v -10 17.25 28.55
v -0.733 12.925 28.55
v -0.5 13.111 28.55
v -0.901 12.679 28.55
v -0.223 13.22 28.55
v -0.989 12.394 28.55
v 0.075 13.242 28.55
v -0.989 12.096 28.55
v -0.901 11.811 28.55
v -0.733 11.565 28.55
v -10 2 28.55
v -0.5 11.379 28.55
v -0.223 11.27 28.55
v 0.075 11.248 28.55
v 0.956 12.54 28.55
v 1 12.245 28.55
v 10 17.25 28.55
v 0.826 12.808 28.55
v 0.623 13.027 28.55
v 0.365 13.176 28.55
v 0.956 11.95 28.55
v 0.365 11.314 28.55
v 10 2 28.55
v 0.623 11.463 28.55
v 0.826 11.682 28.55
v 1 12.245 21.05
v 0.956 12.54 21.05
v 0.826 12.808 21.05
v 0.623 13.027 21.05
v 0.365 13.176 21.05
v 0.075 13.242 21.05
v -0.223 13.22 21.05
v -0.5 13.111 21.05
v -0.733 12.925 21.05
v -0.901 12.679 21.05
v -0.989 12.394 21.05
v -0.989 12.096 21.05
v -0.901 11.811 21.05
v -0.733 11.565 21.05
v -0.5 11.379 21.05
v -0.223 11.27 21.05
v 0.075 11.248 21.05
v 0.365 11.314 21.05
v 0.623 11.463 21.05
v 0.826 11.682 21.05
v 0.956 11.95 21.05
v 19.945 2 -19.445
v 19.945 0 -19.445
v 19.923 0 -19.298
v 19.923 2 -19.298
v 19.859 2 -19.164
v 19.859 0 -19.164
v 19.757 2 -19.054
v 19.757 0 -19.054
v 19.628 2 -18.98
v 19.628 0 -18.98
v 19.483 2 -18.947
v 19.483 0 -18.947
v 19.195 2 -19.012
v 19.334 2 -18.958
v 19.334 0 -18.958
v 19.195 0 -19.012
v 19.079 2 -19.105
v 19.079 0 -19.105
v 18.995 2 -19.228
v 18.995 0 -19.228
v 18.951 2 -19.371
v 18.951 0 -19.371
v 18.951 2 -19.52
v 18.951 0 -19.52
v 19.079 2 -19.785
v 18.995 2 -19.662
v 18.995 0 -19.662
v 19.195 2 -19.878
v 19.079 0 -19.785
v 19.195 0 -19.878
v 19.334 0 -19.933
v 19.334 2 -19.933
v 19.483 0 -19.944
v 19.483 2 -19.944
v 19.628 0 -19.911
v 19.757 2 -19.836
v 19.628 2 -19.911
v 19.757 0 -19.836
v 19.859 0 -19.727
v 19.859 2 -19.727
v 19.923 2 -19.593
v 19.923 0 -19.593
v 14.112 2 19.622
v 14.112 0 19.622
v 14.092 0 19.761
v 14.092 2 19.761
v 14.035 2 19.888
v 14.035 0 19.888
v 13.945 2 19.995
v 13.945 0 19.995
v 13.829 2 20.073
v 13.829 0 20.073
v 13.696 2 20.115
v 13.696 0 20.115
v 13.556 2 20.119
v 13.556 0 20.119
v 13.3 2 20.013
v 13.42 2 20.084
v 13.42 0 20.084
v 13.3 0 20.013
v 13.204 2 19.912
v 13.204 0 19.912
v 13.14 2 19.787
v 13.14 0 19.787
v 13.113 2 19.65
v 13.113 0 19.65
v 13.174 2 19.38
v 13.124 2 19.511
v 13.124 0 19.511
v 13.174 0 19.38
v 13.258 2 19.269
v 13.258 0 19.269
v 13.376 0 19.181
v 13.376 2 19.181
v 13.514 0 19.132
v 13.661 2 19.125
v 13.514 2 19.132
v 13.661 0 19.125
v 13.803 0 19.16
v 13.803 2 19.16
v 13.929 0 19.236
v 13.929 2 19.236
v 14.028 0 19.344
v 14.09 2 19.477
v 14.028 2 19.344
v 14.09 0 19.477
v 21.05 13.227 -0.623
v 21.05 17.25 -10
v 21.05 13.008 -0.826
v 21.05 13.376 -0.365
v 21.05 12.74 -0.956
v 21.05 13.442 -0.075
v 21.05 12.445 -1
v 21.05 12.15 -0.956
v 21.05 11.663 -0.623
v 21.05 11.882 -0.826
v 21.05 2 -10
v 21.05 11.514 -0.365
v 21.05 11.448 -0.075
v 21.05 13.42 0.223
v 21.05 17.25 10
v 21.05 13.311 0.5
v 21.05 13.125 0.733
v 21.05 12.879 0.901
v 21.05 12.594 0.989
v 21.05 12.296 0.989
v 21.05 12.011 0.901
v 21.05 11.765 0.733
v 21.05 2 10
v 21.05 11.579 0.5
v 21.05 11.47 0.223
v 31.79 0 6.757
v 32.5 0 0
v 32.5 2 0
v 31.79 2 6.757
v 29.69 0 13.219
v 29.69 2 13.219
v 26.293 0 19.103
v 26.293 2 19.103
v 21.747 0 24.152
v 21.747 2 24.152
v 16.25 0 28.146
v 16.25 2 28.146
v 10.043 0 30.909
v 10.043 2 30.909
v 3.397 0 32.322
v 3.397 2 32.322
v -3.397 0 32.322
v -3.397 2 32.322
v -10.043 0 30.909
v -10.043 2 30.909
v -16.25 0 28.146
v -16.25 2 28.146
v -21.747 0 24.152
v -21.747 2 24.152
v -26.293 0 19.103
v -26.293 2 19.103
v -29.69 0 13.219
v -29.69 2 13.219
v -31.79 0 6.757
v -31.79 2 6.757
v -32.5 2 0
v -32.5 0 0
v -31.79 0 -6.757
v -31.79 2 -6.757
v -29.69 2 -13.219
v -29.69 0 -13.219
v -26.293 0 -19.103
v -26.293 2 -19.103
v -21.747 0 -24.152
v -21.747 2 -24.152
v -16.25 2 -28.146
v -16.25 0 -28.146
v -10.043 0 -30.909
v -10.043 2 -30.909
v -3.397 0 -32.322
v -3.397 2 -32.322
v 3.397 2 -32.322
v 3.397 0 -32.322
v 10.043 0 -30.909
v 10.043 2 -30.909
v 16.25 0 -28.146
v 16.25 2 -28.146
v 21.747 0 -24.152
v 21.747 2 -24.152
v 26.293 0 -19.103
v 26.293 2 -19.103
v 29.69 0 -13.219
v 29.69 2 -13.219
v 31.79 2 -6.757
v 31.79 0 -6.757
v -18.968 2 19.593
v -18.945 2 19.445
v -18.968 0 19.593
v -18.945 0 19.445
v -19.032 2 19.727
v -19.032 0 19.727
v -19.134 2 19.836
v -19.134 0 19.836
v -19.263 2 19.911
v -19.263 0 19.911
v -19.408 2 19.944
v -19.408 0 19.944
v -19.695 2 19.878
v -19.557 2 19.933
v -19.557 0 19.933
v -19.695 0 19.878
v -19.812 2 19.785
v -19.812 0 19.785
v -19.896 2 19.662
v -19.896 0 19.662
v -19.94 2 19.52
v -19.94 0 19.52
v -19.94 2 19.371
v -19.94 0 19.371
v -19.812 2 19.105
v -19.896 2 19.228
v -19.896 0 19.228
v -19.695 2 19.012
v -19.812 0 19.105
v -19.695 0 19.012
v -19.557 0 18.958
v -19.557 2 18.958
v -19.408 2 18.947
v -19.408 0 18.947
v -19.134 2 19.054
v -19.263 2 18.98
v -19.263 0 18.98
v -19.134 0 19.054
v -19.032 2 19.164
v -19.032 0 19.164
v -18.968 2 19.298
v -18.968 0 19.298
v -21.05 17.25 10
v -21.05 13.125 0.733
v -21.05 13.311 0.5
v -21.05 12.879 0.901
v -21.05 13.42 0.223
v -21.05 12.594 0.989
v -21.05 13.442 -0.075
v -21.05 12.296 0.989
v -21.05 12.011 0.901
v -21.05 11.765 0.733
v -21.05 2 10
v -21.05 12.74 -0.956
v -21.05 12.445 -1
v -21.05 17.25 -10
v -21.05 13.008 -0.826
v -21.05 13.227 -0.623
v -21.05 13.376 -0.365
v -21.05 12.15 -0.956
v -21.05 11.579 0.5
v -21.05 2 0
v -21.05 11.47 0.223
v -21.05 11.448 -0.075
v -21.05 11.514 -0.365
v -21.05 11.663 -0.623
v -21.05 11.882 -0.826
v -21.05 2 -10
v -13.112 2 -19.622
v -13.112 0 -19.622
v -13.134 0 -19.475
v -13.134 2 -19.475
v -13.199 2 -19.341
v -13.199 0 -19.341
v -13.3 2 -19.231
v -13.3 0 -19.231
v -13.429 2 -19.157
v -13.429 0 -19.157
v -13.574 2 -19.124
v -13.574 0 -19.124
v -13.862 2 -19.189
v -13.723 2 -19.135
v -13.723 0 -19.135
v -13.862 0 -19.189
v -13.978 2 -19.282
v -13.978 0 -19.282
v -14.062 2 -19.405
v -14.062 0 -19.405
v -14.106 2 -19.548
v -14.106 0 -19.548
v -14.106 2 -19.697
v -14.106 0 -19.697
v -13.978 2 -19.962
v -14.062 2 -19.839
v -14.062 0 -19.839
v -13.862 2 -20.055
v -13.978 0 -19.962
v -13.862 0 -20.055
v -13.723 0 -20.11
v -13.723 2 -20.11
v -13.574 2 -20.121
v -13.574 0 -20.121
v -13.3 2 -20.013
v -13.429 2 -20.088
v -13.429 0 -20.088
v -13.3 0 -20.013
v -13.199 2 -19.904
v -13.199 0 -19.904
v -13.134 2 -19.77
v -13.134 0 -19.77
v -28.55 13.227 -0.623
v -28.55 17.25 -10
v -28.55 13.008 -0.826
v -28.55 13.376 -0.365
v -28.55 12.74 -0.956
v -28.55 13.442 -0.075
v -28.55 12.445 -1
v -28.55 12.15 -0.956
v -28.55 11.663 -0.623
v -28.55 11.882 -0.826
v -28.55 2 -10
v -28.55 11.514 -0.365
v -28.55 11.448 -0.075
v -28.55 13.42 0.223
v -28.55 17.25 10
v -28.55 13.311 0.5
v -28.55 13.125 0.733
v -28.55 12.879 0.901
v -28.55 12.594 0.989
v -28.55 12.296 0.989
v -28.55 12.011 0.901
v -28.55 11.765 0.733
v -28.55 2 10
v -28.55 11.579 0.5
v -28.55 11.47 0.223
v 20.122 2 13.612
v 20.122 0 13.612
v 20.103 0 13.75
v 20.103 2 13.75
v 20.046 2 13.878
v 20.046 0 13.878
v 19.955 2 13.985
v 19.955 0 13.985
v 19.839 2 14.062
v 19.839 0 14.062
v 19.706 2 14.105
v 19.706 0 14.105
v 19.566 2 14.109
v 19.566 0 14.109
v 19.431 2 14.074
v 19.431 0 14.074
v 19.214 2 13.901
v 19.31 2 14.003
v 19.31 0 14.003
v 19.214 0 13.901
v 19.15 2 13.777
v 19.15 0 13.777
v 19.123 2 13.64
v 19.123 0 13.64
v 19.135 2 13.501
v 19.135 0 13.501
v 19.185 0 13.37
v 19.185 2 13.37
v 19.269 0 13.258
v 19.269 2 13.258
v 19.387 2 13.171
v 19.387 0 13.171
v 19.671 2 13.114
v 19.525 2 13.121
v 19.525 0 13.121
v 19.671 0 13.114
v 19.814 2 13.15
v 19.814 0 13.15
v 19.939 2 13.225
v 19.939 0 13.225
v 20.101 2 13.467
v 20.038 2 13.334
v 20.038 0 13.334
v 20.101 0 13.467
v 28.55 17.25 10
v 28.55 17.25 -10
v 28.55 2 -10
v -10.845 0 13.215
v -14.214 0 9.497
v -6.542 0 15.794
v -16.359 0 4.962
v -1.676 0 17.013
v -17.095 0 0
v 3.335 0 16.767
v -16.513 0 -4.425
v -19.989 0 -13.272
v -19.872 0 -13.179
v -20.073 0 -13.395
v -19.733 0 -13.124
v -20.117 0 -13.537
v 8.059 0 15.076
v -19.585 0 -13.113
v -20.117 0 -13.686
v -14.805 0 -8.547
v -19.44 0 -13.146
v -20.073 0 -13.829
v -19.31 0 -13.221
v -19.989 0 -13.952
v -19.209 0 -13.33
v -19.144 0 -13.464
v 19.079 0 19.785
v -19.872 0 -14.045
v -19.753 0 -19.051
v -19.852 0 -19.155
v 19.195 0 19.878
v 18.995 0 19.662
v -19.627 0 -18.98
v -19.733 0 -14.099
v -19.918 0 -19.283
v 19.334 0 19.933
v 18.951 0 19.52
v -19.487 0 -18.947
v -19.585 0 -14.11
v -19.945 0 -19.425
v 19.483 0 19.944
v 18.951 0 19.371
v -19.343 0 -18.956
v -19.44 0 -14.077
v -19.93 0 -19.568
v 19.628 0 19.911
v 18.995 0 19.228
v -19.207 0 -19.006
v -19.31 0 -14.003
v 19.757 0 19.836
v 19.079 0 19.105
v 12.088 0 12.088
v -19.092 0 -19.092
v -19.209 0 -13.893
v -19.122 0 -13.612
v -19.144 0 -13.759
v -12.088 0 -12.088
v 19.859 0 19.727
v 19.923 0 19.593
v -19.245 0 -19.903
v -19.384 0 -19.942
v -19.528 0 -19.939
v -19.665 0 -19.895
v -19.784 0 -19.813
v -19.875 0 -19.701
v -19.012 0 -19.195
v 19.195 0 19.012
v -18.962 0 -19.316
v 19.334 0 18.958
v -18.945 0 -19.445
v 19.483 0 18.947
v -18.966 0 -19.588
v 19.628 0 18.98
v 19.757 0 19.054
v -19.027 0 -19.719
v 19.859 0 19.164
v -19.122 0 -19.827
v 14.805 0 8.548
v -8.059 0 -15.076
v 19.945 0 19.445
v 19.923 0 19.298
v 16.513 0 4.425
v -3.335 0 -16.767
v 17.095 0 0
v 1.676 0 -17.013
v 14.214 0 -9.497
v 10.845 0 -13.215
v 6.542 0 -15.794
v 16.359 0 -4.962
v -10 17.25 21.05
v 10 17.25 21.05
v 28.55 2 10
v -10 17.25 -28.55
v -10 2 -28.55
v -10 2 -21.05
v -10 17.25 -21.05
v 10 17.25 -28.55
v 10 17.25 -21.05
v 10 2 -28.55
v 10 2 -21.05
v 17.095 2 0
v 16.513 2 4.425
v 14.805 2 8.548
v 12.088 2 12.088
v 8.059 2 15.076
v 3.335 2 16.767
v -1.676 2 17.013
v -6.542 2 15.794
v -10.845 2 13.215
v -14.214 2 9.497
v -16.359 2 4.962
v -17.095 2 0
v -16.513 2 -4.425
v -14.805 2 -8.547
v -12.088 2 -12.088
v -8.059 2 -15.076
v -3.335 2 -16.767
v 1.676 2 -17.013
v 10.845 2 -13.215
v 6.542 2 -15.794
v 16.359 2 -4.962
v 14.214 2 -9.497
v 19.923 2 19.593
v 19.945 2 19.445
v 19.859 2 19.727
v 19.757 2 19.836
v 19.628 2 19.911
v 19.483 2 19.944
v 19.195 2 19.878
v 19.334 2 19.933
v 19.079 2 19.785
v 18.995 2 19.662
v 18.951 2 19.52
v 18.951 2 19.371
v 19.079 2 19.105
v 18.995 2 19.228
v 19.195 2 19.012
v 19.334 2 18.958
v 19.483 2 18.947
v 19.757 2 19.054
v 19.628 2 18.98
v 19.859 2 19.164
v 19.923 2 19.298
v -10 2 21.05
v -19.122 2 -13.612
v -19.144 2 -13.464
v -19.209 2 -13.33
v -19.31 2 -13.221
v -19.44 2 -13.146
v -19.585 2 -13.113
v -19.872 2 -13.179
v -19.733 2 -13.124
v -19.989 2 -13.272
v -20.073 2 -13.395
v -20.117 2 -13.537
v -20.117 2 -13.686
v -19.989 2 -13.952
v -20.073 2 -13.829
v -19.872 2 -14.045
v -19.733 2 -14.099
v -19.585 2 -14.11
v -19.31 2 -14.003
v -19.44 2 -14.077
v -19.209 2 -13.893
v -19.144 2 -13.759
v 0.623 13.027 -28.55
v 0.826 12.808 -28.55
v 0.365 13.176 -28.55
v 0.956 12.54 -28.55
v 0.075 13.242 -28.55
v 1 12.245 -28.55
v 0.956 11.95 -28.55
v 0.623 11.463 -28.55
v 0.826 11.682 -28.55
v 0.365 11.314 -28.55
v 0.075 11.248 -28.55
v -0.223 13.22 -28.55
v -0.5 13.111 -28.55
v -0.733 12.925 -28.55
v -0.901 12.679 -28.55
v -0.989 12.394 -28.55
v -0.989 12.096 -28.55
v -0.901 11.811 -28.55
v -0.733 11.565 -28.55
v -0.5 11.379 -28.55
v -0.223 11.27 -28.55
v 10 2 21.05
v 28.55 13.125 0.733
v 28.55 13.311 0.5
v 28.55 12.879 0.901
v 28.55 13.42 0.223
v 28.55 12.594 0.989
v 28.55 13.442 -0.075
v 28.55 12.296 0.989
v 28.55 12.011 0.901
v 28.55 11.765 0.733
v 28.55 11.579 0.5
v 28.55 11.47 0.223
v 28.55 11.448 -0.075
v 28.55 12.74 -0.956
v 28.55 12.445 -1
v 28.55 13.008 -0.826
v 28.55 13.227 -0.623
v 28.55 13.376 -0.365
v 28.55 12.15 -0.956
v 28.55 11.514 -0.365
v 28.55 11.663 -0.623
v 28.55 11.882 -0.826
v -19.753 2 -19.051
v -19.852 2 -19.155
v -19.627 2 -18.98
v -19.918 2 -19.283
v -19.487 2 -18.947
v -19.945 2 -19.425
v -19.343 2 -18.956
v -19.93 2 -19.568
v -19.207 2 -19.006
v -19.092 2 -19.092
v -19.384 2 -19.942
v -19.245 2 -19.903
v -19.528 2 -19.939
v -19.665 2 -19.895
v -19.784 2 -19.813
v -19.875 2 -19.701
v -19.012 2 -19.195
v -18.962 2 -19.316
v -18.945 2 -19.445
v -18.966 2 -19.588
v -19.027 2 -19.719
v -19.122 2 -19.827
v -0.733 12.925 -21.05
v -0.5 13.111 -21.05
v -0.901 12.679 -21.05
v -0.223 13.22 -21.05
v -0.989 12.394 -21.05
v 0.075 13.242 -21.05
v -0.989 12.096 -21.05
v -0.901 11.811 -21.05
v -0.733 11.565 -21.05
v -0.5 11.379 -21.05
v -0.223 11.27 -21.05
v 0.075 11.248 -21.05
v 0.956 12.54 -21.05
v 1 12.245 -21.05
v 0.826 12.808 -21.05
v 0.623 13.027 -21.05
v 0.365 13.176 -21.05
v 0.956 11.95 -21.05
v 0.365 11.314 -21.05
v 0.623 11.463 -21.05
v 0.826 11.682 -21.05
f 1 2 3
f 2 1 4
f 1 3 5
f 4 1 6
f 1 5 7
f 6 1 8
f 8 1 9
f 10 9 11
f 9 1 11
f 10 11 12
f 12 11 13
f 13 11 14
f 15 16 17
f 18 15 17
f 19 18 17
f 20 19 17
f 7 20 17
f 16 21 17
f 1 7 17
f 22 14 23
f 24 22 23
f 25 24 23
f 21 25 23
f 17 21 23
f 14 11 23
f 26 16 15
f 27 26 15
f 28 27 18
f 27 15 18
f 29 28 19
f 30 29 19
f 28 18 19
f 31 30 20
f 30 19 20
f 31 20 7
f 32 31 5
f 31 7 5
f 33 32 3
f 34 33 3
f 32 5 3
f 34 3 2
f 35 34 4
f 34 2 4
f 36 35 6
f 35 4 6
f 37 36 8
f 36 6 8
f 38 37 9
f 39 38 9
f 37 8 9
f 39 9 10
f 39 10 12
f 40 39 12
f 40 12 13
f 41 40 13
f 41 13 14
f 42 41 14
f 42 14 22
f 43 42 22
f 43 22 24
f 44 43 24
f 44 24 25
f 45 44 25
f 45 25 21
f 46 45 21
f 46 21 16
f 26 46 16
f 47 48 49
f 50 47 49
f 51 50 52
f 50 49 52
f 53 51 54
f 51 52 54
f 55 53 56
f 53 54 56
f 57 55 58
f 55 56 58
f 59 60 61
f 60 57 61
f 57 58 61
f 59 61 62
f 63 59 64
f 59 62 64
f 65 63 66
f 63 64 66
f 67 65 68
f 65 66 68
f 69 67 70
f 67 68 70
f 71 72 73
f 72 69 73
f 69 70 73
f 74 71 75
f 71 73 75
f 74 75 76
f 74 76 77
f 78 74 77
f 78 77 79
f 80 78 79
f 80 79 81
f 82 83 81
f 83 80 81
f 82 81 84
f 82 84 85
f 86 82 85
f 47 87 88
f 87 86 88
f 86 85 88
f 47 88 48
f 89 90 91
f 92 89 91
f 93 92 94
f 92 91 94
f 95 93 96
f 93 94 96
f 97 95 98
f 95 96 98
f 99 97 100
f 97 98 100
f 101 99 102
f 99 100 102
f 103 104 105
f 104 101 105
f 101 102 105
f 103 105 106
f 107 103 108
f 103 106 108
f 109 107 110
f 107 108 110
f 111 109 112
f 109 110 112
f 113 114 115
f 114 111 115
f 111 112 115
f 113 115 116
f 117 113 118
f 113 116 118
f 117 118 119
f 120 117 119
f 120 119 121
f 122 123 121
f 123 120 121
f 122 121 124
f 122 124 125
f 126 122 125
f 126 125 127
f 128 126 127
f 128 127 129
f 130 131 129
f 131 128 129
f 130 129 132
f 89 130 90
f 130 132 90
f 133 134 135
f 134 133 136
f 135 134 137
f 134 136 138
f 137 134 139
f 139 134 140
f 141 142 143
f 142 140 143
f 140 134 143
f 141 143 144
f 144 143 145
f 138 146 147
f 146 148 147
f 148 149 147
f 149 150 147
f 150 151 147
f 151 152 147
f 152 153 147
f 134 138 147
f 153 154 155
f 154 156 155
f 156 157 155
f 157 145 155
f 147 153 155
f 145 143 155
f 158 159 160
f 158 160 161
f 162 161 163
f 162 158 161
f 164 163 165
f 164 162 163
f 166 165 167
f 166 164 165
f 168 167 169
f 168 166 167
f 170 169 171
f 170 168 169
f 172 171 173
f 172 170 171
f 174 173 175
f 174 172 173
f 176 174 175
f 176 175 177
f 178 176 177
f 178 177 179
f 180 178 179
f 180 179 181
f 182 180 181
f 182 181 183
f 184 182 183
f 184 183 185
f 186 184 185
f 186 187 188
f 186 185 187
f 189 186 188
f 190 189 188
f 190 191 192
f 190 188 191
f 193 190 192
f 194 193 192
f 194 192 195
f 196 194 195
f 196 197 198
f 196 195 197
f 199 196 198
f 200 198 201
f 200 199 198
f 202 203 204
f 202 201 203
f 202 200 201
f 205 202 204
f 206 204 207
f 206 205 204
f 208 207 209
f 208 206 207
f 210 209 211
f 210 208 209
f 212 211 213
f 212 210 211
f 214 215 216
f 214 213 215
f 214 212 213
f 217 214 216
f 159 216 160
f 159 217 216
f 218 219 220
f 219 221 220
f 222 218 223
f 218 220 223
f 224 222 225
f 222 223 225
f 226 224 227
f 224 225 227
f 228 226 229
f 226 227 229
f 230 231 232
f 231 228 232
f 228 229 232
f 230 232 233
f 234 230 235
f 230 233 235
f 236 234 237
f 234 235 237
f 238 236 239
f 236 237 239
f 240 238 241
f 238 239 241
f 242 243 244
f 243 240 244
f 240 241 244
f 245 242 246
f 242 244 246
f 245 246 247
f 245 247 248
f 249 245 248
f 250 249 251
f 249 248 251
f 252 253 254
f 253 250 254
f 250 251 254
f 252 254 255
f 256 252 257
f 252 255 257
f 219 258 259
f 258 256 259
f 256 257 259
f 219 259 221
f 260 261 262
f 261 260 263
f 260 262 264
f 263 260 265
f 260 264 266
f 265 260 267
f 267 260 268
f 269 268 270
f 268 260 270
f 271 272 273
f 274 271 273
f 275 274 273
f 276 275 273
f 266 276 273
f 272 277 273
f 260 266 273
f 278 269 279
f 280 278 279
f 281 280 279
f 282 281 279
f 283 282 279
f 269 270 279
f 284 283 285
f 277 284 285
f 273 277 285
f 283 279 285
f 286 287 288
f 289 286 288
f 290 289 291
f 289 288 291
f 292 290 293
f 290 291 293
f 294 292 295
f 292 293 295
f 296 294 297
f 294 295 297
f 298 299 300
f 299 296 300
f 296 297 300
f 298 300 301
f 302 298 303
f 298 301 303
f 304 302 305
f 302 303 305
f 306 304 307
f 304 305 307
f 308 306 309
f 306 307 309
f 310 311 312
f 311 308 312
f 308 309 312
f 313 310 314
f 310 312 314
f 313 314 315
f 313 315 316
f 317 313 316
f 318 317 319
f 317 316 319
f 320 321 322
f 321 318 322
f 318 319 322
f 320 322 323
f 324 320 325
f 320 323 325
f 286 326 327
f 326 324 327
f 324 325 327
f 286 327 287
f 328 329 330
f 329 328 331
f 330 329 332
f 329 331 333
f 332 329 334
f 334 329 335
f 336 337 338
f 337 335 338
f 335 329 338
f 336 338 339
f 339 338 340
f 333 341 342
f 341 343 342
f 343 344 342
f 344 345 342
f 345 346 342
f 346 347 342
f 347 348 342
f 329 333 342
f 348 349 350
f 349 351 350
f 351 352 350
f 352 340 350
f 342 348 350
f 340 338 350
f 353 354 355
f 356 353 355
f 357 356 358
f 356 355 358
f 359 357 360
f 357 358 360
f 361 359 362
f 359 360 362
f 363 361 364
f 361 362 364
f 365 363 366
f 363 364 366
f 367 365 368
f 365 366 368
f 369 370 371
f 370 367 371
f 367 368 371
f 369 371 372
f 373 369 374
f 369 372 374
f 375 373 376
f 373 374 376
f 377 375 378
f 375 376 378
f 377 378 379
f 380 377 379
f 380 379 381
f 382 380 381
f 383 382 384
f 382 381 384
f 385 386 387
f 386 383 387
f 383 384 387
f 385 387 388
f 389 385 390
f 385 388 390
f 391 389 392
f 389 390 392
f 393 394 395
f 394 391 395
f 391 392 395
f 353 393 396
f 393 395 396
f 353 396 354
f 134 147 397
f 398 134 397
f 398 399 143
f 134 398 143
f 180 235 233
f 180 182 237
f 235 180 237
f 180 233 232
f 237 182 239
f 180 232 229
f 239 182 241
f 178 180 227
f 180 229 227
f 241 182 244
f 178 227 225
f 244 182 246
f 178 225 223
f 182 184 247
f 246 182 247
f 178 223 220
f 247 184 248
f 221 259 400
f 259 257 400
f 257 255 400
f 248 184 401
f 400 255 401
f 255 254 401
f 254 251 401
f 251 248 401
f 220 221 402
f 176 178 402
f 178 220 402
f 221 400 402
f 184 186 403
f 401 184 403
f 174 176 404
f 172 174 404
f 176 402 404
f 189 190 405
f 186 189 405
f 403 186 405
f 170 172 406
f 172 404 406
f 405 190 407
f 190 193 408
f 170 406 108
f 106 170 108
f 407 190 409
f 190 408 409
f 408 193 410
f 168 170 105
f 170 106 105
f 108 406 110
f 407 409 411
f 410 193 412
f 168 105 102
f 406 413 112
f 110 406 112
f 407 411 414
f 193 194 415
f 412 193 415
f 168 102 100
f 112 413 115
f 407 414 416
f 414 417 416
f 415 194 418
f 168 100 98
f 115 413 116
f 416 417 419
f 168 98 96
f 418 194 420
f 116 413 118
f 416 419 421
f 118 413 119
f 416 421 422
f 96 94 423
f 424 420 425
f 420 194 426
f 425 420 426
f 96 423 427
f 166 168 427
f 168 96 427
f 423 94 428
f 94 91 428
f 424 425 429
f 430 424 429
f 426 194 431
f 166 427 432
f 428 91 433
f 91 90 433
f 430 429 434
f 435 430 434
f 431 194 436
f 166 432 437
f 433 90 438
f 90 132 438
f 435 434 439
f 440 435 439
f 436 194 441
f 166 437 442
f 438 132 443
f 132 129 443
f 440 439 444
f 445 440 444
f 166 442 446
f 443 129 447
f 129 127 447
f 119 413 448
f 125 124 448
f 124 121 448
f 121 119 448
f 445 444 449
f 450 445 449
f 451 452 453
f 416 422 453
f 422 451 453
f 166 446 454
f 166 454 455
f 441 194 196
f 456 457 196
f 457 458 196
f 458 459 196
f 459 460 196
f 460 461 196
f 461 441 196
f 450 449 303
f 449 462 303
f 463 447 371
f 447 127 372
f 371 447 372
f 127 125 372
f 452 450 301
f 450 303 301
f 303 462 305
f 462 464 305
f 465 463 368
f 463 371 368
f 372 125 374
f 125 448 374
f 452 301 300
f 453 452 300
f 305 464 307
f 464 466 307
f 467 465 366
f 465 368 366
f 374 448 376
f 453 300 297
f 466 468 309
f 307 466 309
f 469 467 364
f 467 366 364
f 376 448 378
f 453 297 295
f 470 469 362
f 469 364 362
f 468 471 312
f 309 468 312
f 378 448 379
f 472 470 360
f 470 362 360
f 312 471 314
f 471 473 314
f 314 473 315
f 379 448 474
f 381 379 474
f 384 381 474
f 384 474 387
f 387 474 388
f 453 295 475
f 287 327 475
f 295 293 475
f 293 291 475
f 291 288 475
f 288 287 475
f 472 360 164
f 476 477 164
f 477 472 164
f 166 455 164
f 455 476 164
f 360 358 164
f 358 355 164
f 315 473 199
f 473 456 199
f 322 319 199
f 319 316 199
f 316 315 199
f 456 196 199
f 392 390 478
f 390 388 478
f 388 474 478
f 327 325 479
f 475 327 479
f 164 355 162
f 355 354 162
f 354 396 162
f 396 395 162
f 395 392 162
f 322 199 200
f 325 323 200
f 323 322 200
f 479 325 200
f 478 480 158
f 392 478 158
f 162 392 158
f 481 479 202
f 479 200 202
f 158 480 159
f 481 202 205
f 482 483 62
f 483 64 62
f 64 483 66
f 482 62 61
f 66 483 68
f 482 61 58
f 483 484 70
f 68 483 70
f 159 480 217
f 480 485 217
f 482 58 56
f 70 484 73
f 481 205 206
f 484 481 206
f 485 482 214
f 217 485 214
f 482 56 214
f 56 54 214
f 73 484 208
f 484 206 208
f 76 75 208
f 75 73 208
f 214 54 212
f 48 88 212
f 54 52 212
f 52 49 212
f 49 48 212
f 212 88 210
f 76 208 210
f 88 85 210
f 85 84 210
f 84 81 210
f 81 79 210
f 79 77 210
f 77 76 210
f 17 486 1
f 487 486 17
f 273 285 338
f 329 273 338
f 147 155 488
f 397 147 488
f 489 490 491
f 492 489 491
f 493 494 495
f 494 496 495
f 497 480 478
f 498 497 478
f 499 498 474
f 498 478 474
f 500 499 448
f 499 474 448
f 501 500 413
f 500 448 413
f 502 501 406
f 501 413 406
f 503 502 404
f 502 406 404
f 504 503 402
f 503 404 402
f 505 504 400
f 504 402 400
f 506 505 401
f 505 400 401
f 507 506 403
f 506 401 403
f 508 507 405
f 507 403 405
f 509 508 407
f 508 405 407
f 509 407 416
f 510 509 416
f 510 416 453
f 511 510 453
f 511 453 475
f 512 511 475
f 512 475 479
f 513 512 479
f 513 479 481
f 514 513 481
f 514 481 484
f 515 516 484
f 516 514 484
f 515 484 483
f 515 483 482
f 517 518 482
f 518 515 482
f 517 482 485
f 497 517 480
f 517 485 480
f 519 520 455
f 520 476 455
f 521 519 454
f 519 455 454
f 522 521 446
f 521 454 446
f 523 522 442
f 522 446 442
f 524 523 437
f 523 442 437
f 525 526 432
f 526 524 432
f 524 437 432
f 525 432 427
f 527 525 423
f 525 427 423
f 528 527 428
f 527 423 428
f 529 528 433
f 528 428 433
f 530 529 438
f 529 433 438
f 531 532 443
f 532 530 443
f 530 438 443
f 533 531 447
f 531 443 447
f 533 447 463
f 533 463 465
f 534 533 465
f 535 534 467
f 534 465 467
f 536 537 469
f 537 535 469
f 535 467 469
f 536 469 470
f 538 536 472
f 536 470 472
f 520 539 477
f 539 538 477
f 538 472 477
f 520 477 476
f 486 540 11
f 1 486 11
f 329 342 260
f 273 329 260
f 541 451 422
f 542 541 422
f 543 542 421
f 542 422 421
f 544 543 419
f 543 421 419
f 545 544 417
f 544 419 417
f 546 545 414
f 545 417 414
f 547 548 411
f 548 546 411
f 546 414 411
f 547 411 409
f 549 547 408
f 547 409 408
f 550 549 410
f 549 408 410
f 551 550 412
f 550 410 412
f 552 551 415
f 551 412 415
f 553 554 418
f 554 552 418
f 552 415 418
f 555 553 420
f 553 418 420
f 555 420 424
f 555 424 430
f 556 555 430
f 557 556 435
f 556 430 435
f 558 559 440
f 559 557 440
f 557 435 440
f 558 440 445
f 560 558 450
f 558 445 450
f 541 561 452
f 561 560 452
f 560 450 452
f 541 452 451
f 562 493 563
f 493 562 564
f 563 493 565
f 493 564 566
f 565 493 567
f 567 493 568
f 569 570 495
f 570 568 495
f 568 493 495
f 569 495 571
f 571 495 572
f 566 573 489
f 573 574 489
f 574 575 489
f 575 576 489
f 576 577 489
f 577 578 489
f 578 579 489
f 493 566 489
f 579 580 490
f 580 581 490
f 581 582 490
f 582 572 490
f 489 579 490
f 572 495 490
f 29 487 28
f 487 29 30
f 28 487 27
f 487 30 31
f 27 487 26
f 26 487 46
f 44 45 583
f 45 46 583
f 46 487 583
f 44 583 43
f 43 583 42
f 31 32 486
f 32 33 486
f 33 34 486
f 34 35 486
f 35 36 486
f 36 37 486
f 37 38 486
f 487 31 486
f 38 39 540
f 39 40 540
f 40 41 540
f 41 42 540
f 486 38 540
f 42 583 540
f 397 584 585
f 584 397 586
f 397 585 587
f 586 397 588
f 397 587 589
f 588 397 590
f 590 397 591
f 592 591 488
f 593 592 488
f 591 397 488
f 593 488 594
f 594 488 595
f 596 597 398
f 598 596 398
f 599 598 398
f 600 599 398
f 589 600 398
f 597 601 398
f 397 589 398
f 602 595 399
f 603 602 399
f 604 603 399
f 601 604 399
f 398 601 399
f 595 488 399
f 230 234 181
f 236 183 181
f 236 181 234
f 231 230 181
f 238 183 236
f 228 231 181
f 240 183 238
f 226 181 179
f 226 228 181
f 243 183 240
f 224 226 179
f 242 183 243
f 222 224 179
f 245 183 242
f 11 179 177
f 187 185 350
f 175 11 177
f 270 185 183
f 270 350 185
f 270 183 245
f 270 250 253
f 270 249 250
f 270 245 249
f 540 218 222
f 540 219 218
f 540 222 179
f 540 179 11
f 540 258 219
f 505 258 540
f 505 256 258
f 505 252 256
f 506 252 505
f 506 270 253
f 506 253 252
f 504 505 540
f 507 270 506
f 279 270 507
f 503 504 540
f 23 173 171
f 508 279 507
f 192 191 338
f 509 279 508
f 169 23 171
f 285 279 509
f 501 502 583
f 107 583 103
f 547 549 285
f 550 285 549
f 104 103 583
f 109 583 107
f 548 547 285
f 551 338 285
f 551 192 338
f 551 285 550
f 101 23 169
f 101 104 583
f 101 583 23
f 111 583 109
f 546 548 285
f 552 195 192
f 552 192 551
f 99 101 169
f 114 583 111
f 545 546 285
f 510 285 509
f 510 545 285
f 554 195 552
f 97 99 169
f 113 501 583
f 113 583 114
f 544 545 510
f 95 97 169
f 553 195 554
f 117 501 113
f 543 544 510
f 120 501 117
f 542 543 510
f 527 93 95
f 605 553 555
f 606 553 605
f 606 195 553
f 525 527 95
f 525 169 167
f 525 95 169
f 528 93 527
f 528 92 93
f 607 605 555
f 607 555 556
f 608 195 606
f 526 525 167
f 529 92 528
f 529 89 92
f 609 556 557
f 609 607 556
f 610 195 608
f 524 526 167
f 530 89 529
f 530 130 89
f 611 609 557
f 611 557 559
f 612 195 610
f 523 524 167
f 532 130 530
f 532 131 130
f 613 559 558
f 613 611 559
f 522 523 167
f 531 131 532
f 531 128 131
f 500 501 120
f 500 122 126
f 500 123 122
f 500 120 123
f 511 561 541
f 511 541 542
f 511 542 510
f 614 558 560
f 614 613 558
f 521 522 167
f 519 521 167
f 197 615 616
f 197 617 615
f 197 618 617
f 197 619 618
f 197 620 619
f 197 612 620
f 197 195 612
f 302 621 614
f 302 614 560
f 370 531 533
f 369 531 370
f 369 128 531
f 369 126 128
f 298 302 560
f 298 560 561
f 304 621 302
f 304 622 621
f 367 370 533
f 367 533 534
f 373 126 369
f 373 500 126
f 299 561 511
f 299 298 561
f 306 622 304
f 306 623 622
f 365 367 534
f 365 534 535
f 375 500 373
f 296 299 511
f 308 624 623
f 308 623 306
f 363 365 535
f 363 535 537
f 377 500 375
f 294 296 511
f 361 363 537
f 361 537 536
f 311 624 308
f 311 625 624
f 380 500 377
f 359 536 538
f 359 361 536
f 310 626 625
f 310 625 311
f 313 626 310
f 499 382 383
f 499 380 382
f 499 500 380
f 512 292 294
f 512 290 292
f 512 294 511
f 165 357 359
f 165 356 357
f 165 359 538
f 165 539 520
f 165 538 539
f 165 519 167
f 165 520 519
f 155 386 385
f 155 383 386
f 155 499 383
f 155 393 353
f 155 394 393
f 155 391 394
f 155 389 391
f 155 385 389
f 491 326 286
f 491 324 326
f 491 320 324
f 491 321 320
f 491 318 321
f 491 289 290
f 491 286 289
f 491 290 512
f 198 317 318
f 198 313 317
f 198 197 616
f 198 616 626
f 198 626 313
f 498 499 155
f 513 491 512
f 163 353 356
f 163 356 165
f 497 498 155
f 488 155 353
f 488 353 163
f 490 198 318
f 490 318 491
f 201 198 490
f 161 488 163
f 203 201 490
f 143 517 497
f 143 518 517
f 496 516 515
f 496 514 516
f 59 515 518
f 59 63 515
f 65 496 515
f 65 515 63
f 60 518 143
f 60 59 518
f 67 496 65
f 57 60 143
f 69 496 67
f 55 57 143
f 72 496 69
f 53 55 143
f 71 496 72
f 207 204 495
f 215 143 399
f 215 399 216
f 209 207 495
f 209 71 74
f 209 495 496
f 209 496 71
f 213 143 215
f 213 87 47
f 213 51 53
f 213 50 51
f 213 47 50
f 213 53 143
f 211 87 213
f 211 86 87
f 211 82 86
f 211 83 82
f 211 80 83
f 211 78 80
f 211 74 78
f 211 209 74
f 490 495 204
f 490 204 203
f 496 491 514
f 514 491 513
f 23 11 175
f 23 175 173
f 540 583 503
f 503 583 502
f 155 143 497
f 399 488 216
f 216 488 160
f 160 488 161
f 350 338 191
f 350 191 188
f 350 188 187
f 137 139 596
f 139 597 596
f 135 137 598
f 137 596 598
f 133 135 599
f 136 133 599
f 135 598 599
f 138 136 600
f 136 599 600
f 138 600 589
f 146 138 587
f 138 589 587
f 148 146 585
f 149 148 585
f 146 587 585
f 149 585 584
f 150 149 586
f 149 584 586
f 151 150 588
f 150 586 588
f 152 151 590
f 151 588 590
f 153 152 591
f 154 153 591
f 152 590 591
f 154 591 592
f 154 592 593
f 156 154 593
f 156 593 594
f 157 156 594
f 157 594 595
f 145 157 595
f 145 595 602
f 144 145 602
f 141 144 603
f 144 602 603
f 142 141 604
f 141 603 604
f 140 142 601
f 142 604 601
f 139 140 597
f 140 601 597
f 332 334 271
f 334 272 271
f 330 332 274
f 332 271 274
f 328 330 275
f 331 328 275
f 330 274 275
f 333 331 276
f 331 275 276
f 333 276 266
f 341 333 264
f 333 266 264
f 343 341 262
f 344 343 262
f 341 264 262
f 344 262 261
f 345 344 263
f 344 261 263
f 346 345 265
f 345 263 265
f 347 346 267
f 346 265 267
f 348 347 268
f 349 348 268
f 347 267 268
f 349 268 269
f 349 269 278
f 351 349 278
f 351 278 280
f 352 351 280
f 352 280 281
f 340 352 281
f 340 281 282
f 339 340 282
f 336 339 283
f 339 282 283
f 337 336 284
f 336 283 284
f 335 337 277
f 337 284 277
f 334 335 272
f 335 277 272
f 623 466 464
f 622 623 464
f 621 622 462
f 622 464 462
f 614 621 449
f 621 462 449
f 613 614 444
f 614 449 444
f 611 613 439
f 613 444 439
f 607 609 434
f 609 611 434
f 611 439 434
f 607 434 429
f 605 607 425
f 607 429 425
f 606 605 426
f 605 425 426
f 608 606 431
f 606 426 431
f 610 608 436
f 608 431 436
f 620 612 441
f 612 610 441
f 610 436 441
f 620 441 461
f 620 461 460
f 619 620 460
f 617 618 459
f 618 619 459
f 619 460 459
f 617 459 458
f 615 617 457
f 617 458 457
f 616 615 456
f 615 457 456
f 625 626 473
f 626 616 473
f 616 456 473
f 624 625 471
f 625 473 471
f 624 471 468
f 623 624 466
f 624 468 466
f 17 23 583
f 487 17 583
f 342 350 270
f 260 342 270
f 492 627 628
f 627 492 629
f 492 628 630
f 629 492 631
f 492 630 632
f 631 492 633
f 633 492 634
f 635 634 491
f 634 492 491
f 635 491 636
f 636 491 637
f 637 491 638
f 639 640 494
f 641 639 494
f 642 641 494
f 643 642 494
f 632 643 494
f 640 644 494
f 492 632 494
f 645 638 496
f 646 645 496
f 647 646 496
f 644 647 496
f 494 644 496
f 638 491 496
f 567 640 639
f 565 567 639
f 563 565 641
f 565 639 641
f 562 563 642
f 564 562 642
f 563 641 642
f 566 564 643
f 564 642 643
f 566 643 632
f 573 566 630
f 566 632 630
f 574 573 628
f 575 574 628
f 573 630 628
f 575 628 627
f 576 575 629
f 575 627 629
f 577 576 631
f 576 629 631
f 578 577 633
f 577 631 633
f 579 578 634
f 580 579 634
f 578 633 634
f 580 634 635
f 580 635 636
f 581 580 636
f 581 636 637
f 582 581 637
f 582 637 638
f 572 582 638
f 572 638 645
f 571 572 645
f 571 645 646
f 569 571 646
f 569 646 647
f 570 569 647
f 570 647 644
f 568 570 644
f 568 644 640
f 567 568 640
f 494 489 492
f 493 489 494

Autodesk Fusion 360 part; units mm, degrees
sketch "Sketch1" plane through (0, 0, 0) normal (0, 1, 0) x (1, 0, 0)
  circle A0 centre (0, 0) radius 17.095
  circle A1 centre (0, 0) radius 32.5
  line L0 (-21.05, 10) -> (-28.55, 10)
  line L1 (-28.55, 10) -> (-28.55, -10)
  line L2 (-28.55, -10) -> (-21.05, -10)
  line L3 (-21.05, -10) -> (-21.05, 10)
  line L4 (-21.05, 0) -> (0, 0)
  line L5 (0, 0) -> (-19.4454, 19.4454)
  circle A2 centre (-19.4454, 19.4454) radius 0.5
  line L6 (-10, -21.05) -> (-10, -28.55)
  line L7 (10, -28.55) -> (10, -21.05)
  line L8 (-10, -28.55) -> (10, -28.55)
  line L9 (10, -21.05) -> (-10, -21.05)
  circle A3 centre (-19.4454, -19.4454) radius 0.5
  line L10 (21.05, -10) -> (28.55, -10)
  line L11 (28.55, 10) -> (21.05, 10)
  line L12 (28.55, -10) -> (28.55, 10)
  line L13 (21.05, 10) -> (21.05, -10)
  circle A4 centre (19.4454, -19.4454) radius 0.5
  line L14 (10, 21.05) -> (10, 28.55)
  line L15 (-10, 28.55) -> (-10, 21.05)
  line L16 (10, 28.55) -> (-10, 28.55)
  line L17 (-10, 21.05) -> (10, 21.05)
  circle A5 centre (19.4454, 19.4454) radius 0.5
  line L18 (17.3241, -8.1317) -> (8.1317, -17.3241)
  line L19 (0, 0) -> (12.7279, -12.7279)
  line L20 (10.253, -19.4454) -> (8.1317, -17.3241)
  line L21 (8.1317, -17.3241) -> (11.3137, -14.1421)
  line L22 (11.3137, -14.1421) -> (13.435, -16.2635)
  line L23 (13.435, -16.2635) -> (10.253, -19.4454)
  line L24 (19.4454, -10.253) -> (17.3241, -8.1317)
  line L25 (17.3241, -8.1317) -> (14.1421, -11.3137)
  line L26 (14.1421, -11.3137) -> (16.2635, -13.435)
  line L27 (16.2635, -13.435) -> (19.4454, -10.253)
  line L28 (11.844, -17.8544) -> (13.6118, -19.6222)
  circle A6 centre (13.6118, -19.6222) radius 0.5
  line L29 (17.8544, -11.844) -> (19.6222, -13.6118)
  circle A7 centre (19.6222, -13.6118) radius 0.5
  circle A8 centre (-13.6118, 19.6222) radius 0.5
  circle A9 centre (-19.6222, 13.6118) radius 0.5
  point P0 (0, -21.05)
  point P1 (21.05, 0)
  point P2 (0, 21.05)
  dimension "d1" = 34.19
  dimension "d2" = 65
  dimension "d4" = 21.05
  dimension "d5" = 20
  dimension "d6" = 7.5
  dimension "d7" = 27.5
  dimension "d8" = 1
  dimension "d9" = 45
  dimension "d11" = 360
  dimension "d13" = 13
  dimension "d14" = 18
  dimension "d15" = 3
  dimension "d16" = 4.5
  dimension "d17" = 3
  dimension "d18" = 4.5
  dimension "d19" = 2.5
  dimension "d20" = 1
  dimension "d21" = 2.5
  dimension "d22" = 1
  dimension "d24" = 360
extrude "Extrude1" add sketch "Sketch1" along normal blind 12.45 contours L0 L1 L2 L3 | L6 L7 L8 L9 | L10 L11 L12 L13 | L14 L15 L16 L17 makes body 1 at (3.3333, 4.15, 21.05) makes body 2 at (21.05, 4.15, -3.3333) makes body 3 at (-21.05, 4.15, 3.3333) makes body 4 at (-3.3333, 4.15, -21.05)
extrude "Extrude2" add sketch "Sketch1" along normal blind 2 contours L18 L24 L25 L26 L27 | L18 L20 L21 L22 L23 | A1 bodies 1 2 3 4
extrude "Extrude3" add 4 faces at (-26.05, 12.45, 3.3333) (-3.3333, 12.45, 23.55) (23.55, 12.45, -3.3333) (3.3333, 12.45, -23.55) along direction (0, 1, 0) blind 1.8 on bodies 1 bodies 1
sketch "Sketch2" plane through (0, 0, 28.55) normal (0, 0, 1) x (1, 0, 0)
  line L0 (-10, 2) -> (10, 2)
  line L1 (10, 2) -> (10, 14.25)
  line L2 (10, 14.25) -> (-10, 14.25)
  line L3 (-10, 14.25) -> (-10, 2)
  circle A0 centre (0, 12.245) radius 1
  dimension "d31" = 2
  dimension "d32" = 12.245
extrude "Extrude4" add 4 faces at (-3.3333, 14.25, 23.55) (23.55, 14.25, -3.3333) (3.3333, 14.25, -23.55) (-26.05, 14.25, 3.3333) along direction (0, 1, 0) blind 3 on bodies 1 bodies 1
sketch "Sketch3" plane through (28.55, 0, 0) normal (1, 0, 0) x (0, 0, -1)
  line L0 (-10, 2) -> (10, 2)
  line L1 (10, 2) -> (10, 17.25)
  line L2 (10, 17.25) -> (-10, 17.25)
  line L3 (-10, 17.25) -> (-10, 2)
  circle A0 centre (0, 12.445) radius 1
  dimension "d35" = 2
  dimension "d36" = 12.445
extrude "Extrude5" cut sketch "Sketch3" against normal blind 60 contours A0 bodies 1
extrude "Extrude6" cut sketch "Sketch2" against normal blind 60 contours A0 bodies 1
